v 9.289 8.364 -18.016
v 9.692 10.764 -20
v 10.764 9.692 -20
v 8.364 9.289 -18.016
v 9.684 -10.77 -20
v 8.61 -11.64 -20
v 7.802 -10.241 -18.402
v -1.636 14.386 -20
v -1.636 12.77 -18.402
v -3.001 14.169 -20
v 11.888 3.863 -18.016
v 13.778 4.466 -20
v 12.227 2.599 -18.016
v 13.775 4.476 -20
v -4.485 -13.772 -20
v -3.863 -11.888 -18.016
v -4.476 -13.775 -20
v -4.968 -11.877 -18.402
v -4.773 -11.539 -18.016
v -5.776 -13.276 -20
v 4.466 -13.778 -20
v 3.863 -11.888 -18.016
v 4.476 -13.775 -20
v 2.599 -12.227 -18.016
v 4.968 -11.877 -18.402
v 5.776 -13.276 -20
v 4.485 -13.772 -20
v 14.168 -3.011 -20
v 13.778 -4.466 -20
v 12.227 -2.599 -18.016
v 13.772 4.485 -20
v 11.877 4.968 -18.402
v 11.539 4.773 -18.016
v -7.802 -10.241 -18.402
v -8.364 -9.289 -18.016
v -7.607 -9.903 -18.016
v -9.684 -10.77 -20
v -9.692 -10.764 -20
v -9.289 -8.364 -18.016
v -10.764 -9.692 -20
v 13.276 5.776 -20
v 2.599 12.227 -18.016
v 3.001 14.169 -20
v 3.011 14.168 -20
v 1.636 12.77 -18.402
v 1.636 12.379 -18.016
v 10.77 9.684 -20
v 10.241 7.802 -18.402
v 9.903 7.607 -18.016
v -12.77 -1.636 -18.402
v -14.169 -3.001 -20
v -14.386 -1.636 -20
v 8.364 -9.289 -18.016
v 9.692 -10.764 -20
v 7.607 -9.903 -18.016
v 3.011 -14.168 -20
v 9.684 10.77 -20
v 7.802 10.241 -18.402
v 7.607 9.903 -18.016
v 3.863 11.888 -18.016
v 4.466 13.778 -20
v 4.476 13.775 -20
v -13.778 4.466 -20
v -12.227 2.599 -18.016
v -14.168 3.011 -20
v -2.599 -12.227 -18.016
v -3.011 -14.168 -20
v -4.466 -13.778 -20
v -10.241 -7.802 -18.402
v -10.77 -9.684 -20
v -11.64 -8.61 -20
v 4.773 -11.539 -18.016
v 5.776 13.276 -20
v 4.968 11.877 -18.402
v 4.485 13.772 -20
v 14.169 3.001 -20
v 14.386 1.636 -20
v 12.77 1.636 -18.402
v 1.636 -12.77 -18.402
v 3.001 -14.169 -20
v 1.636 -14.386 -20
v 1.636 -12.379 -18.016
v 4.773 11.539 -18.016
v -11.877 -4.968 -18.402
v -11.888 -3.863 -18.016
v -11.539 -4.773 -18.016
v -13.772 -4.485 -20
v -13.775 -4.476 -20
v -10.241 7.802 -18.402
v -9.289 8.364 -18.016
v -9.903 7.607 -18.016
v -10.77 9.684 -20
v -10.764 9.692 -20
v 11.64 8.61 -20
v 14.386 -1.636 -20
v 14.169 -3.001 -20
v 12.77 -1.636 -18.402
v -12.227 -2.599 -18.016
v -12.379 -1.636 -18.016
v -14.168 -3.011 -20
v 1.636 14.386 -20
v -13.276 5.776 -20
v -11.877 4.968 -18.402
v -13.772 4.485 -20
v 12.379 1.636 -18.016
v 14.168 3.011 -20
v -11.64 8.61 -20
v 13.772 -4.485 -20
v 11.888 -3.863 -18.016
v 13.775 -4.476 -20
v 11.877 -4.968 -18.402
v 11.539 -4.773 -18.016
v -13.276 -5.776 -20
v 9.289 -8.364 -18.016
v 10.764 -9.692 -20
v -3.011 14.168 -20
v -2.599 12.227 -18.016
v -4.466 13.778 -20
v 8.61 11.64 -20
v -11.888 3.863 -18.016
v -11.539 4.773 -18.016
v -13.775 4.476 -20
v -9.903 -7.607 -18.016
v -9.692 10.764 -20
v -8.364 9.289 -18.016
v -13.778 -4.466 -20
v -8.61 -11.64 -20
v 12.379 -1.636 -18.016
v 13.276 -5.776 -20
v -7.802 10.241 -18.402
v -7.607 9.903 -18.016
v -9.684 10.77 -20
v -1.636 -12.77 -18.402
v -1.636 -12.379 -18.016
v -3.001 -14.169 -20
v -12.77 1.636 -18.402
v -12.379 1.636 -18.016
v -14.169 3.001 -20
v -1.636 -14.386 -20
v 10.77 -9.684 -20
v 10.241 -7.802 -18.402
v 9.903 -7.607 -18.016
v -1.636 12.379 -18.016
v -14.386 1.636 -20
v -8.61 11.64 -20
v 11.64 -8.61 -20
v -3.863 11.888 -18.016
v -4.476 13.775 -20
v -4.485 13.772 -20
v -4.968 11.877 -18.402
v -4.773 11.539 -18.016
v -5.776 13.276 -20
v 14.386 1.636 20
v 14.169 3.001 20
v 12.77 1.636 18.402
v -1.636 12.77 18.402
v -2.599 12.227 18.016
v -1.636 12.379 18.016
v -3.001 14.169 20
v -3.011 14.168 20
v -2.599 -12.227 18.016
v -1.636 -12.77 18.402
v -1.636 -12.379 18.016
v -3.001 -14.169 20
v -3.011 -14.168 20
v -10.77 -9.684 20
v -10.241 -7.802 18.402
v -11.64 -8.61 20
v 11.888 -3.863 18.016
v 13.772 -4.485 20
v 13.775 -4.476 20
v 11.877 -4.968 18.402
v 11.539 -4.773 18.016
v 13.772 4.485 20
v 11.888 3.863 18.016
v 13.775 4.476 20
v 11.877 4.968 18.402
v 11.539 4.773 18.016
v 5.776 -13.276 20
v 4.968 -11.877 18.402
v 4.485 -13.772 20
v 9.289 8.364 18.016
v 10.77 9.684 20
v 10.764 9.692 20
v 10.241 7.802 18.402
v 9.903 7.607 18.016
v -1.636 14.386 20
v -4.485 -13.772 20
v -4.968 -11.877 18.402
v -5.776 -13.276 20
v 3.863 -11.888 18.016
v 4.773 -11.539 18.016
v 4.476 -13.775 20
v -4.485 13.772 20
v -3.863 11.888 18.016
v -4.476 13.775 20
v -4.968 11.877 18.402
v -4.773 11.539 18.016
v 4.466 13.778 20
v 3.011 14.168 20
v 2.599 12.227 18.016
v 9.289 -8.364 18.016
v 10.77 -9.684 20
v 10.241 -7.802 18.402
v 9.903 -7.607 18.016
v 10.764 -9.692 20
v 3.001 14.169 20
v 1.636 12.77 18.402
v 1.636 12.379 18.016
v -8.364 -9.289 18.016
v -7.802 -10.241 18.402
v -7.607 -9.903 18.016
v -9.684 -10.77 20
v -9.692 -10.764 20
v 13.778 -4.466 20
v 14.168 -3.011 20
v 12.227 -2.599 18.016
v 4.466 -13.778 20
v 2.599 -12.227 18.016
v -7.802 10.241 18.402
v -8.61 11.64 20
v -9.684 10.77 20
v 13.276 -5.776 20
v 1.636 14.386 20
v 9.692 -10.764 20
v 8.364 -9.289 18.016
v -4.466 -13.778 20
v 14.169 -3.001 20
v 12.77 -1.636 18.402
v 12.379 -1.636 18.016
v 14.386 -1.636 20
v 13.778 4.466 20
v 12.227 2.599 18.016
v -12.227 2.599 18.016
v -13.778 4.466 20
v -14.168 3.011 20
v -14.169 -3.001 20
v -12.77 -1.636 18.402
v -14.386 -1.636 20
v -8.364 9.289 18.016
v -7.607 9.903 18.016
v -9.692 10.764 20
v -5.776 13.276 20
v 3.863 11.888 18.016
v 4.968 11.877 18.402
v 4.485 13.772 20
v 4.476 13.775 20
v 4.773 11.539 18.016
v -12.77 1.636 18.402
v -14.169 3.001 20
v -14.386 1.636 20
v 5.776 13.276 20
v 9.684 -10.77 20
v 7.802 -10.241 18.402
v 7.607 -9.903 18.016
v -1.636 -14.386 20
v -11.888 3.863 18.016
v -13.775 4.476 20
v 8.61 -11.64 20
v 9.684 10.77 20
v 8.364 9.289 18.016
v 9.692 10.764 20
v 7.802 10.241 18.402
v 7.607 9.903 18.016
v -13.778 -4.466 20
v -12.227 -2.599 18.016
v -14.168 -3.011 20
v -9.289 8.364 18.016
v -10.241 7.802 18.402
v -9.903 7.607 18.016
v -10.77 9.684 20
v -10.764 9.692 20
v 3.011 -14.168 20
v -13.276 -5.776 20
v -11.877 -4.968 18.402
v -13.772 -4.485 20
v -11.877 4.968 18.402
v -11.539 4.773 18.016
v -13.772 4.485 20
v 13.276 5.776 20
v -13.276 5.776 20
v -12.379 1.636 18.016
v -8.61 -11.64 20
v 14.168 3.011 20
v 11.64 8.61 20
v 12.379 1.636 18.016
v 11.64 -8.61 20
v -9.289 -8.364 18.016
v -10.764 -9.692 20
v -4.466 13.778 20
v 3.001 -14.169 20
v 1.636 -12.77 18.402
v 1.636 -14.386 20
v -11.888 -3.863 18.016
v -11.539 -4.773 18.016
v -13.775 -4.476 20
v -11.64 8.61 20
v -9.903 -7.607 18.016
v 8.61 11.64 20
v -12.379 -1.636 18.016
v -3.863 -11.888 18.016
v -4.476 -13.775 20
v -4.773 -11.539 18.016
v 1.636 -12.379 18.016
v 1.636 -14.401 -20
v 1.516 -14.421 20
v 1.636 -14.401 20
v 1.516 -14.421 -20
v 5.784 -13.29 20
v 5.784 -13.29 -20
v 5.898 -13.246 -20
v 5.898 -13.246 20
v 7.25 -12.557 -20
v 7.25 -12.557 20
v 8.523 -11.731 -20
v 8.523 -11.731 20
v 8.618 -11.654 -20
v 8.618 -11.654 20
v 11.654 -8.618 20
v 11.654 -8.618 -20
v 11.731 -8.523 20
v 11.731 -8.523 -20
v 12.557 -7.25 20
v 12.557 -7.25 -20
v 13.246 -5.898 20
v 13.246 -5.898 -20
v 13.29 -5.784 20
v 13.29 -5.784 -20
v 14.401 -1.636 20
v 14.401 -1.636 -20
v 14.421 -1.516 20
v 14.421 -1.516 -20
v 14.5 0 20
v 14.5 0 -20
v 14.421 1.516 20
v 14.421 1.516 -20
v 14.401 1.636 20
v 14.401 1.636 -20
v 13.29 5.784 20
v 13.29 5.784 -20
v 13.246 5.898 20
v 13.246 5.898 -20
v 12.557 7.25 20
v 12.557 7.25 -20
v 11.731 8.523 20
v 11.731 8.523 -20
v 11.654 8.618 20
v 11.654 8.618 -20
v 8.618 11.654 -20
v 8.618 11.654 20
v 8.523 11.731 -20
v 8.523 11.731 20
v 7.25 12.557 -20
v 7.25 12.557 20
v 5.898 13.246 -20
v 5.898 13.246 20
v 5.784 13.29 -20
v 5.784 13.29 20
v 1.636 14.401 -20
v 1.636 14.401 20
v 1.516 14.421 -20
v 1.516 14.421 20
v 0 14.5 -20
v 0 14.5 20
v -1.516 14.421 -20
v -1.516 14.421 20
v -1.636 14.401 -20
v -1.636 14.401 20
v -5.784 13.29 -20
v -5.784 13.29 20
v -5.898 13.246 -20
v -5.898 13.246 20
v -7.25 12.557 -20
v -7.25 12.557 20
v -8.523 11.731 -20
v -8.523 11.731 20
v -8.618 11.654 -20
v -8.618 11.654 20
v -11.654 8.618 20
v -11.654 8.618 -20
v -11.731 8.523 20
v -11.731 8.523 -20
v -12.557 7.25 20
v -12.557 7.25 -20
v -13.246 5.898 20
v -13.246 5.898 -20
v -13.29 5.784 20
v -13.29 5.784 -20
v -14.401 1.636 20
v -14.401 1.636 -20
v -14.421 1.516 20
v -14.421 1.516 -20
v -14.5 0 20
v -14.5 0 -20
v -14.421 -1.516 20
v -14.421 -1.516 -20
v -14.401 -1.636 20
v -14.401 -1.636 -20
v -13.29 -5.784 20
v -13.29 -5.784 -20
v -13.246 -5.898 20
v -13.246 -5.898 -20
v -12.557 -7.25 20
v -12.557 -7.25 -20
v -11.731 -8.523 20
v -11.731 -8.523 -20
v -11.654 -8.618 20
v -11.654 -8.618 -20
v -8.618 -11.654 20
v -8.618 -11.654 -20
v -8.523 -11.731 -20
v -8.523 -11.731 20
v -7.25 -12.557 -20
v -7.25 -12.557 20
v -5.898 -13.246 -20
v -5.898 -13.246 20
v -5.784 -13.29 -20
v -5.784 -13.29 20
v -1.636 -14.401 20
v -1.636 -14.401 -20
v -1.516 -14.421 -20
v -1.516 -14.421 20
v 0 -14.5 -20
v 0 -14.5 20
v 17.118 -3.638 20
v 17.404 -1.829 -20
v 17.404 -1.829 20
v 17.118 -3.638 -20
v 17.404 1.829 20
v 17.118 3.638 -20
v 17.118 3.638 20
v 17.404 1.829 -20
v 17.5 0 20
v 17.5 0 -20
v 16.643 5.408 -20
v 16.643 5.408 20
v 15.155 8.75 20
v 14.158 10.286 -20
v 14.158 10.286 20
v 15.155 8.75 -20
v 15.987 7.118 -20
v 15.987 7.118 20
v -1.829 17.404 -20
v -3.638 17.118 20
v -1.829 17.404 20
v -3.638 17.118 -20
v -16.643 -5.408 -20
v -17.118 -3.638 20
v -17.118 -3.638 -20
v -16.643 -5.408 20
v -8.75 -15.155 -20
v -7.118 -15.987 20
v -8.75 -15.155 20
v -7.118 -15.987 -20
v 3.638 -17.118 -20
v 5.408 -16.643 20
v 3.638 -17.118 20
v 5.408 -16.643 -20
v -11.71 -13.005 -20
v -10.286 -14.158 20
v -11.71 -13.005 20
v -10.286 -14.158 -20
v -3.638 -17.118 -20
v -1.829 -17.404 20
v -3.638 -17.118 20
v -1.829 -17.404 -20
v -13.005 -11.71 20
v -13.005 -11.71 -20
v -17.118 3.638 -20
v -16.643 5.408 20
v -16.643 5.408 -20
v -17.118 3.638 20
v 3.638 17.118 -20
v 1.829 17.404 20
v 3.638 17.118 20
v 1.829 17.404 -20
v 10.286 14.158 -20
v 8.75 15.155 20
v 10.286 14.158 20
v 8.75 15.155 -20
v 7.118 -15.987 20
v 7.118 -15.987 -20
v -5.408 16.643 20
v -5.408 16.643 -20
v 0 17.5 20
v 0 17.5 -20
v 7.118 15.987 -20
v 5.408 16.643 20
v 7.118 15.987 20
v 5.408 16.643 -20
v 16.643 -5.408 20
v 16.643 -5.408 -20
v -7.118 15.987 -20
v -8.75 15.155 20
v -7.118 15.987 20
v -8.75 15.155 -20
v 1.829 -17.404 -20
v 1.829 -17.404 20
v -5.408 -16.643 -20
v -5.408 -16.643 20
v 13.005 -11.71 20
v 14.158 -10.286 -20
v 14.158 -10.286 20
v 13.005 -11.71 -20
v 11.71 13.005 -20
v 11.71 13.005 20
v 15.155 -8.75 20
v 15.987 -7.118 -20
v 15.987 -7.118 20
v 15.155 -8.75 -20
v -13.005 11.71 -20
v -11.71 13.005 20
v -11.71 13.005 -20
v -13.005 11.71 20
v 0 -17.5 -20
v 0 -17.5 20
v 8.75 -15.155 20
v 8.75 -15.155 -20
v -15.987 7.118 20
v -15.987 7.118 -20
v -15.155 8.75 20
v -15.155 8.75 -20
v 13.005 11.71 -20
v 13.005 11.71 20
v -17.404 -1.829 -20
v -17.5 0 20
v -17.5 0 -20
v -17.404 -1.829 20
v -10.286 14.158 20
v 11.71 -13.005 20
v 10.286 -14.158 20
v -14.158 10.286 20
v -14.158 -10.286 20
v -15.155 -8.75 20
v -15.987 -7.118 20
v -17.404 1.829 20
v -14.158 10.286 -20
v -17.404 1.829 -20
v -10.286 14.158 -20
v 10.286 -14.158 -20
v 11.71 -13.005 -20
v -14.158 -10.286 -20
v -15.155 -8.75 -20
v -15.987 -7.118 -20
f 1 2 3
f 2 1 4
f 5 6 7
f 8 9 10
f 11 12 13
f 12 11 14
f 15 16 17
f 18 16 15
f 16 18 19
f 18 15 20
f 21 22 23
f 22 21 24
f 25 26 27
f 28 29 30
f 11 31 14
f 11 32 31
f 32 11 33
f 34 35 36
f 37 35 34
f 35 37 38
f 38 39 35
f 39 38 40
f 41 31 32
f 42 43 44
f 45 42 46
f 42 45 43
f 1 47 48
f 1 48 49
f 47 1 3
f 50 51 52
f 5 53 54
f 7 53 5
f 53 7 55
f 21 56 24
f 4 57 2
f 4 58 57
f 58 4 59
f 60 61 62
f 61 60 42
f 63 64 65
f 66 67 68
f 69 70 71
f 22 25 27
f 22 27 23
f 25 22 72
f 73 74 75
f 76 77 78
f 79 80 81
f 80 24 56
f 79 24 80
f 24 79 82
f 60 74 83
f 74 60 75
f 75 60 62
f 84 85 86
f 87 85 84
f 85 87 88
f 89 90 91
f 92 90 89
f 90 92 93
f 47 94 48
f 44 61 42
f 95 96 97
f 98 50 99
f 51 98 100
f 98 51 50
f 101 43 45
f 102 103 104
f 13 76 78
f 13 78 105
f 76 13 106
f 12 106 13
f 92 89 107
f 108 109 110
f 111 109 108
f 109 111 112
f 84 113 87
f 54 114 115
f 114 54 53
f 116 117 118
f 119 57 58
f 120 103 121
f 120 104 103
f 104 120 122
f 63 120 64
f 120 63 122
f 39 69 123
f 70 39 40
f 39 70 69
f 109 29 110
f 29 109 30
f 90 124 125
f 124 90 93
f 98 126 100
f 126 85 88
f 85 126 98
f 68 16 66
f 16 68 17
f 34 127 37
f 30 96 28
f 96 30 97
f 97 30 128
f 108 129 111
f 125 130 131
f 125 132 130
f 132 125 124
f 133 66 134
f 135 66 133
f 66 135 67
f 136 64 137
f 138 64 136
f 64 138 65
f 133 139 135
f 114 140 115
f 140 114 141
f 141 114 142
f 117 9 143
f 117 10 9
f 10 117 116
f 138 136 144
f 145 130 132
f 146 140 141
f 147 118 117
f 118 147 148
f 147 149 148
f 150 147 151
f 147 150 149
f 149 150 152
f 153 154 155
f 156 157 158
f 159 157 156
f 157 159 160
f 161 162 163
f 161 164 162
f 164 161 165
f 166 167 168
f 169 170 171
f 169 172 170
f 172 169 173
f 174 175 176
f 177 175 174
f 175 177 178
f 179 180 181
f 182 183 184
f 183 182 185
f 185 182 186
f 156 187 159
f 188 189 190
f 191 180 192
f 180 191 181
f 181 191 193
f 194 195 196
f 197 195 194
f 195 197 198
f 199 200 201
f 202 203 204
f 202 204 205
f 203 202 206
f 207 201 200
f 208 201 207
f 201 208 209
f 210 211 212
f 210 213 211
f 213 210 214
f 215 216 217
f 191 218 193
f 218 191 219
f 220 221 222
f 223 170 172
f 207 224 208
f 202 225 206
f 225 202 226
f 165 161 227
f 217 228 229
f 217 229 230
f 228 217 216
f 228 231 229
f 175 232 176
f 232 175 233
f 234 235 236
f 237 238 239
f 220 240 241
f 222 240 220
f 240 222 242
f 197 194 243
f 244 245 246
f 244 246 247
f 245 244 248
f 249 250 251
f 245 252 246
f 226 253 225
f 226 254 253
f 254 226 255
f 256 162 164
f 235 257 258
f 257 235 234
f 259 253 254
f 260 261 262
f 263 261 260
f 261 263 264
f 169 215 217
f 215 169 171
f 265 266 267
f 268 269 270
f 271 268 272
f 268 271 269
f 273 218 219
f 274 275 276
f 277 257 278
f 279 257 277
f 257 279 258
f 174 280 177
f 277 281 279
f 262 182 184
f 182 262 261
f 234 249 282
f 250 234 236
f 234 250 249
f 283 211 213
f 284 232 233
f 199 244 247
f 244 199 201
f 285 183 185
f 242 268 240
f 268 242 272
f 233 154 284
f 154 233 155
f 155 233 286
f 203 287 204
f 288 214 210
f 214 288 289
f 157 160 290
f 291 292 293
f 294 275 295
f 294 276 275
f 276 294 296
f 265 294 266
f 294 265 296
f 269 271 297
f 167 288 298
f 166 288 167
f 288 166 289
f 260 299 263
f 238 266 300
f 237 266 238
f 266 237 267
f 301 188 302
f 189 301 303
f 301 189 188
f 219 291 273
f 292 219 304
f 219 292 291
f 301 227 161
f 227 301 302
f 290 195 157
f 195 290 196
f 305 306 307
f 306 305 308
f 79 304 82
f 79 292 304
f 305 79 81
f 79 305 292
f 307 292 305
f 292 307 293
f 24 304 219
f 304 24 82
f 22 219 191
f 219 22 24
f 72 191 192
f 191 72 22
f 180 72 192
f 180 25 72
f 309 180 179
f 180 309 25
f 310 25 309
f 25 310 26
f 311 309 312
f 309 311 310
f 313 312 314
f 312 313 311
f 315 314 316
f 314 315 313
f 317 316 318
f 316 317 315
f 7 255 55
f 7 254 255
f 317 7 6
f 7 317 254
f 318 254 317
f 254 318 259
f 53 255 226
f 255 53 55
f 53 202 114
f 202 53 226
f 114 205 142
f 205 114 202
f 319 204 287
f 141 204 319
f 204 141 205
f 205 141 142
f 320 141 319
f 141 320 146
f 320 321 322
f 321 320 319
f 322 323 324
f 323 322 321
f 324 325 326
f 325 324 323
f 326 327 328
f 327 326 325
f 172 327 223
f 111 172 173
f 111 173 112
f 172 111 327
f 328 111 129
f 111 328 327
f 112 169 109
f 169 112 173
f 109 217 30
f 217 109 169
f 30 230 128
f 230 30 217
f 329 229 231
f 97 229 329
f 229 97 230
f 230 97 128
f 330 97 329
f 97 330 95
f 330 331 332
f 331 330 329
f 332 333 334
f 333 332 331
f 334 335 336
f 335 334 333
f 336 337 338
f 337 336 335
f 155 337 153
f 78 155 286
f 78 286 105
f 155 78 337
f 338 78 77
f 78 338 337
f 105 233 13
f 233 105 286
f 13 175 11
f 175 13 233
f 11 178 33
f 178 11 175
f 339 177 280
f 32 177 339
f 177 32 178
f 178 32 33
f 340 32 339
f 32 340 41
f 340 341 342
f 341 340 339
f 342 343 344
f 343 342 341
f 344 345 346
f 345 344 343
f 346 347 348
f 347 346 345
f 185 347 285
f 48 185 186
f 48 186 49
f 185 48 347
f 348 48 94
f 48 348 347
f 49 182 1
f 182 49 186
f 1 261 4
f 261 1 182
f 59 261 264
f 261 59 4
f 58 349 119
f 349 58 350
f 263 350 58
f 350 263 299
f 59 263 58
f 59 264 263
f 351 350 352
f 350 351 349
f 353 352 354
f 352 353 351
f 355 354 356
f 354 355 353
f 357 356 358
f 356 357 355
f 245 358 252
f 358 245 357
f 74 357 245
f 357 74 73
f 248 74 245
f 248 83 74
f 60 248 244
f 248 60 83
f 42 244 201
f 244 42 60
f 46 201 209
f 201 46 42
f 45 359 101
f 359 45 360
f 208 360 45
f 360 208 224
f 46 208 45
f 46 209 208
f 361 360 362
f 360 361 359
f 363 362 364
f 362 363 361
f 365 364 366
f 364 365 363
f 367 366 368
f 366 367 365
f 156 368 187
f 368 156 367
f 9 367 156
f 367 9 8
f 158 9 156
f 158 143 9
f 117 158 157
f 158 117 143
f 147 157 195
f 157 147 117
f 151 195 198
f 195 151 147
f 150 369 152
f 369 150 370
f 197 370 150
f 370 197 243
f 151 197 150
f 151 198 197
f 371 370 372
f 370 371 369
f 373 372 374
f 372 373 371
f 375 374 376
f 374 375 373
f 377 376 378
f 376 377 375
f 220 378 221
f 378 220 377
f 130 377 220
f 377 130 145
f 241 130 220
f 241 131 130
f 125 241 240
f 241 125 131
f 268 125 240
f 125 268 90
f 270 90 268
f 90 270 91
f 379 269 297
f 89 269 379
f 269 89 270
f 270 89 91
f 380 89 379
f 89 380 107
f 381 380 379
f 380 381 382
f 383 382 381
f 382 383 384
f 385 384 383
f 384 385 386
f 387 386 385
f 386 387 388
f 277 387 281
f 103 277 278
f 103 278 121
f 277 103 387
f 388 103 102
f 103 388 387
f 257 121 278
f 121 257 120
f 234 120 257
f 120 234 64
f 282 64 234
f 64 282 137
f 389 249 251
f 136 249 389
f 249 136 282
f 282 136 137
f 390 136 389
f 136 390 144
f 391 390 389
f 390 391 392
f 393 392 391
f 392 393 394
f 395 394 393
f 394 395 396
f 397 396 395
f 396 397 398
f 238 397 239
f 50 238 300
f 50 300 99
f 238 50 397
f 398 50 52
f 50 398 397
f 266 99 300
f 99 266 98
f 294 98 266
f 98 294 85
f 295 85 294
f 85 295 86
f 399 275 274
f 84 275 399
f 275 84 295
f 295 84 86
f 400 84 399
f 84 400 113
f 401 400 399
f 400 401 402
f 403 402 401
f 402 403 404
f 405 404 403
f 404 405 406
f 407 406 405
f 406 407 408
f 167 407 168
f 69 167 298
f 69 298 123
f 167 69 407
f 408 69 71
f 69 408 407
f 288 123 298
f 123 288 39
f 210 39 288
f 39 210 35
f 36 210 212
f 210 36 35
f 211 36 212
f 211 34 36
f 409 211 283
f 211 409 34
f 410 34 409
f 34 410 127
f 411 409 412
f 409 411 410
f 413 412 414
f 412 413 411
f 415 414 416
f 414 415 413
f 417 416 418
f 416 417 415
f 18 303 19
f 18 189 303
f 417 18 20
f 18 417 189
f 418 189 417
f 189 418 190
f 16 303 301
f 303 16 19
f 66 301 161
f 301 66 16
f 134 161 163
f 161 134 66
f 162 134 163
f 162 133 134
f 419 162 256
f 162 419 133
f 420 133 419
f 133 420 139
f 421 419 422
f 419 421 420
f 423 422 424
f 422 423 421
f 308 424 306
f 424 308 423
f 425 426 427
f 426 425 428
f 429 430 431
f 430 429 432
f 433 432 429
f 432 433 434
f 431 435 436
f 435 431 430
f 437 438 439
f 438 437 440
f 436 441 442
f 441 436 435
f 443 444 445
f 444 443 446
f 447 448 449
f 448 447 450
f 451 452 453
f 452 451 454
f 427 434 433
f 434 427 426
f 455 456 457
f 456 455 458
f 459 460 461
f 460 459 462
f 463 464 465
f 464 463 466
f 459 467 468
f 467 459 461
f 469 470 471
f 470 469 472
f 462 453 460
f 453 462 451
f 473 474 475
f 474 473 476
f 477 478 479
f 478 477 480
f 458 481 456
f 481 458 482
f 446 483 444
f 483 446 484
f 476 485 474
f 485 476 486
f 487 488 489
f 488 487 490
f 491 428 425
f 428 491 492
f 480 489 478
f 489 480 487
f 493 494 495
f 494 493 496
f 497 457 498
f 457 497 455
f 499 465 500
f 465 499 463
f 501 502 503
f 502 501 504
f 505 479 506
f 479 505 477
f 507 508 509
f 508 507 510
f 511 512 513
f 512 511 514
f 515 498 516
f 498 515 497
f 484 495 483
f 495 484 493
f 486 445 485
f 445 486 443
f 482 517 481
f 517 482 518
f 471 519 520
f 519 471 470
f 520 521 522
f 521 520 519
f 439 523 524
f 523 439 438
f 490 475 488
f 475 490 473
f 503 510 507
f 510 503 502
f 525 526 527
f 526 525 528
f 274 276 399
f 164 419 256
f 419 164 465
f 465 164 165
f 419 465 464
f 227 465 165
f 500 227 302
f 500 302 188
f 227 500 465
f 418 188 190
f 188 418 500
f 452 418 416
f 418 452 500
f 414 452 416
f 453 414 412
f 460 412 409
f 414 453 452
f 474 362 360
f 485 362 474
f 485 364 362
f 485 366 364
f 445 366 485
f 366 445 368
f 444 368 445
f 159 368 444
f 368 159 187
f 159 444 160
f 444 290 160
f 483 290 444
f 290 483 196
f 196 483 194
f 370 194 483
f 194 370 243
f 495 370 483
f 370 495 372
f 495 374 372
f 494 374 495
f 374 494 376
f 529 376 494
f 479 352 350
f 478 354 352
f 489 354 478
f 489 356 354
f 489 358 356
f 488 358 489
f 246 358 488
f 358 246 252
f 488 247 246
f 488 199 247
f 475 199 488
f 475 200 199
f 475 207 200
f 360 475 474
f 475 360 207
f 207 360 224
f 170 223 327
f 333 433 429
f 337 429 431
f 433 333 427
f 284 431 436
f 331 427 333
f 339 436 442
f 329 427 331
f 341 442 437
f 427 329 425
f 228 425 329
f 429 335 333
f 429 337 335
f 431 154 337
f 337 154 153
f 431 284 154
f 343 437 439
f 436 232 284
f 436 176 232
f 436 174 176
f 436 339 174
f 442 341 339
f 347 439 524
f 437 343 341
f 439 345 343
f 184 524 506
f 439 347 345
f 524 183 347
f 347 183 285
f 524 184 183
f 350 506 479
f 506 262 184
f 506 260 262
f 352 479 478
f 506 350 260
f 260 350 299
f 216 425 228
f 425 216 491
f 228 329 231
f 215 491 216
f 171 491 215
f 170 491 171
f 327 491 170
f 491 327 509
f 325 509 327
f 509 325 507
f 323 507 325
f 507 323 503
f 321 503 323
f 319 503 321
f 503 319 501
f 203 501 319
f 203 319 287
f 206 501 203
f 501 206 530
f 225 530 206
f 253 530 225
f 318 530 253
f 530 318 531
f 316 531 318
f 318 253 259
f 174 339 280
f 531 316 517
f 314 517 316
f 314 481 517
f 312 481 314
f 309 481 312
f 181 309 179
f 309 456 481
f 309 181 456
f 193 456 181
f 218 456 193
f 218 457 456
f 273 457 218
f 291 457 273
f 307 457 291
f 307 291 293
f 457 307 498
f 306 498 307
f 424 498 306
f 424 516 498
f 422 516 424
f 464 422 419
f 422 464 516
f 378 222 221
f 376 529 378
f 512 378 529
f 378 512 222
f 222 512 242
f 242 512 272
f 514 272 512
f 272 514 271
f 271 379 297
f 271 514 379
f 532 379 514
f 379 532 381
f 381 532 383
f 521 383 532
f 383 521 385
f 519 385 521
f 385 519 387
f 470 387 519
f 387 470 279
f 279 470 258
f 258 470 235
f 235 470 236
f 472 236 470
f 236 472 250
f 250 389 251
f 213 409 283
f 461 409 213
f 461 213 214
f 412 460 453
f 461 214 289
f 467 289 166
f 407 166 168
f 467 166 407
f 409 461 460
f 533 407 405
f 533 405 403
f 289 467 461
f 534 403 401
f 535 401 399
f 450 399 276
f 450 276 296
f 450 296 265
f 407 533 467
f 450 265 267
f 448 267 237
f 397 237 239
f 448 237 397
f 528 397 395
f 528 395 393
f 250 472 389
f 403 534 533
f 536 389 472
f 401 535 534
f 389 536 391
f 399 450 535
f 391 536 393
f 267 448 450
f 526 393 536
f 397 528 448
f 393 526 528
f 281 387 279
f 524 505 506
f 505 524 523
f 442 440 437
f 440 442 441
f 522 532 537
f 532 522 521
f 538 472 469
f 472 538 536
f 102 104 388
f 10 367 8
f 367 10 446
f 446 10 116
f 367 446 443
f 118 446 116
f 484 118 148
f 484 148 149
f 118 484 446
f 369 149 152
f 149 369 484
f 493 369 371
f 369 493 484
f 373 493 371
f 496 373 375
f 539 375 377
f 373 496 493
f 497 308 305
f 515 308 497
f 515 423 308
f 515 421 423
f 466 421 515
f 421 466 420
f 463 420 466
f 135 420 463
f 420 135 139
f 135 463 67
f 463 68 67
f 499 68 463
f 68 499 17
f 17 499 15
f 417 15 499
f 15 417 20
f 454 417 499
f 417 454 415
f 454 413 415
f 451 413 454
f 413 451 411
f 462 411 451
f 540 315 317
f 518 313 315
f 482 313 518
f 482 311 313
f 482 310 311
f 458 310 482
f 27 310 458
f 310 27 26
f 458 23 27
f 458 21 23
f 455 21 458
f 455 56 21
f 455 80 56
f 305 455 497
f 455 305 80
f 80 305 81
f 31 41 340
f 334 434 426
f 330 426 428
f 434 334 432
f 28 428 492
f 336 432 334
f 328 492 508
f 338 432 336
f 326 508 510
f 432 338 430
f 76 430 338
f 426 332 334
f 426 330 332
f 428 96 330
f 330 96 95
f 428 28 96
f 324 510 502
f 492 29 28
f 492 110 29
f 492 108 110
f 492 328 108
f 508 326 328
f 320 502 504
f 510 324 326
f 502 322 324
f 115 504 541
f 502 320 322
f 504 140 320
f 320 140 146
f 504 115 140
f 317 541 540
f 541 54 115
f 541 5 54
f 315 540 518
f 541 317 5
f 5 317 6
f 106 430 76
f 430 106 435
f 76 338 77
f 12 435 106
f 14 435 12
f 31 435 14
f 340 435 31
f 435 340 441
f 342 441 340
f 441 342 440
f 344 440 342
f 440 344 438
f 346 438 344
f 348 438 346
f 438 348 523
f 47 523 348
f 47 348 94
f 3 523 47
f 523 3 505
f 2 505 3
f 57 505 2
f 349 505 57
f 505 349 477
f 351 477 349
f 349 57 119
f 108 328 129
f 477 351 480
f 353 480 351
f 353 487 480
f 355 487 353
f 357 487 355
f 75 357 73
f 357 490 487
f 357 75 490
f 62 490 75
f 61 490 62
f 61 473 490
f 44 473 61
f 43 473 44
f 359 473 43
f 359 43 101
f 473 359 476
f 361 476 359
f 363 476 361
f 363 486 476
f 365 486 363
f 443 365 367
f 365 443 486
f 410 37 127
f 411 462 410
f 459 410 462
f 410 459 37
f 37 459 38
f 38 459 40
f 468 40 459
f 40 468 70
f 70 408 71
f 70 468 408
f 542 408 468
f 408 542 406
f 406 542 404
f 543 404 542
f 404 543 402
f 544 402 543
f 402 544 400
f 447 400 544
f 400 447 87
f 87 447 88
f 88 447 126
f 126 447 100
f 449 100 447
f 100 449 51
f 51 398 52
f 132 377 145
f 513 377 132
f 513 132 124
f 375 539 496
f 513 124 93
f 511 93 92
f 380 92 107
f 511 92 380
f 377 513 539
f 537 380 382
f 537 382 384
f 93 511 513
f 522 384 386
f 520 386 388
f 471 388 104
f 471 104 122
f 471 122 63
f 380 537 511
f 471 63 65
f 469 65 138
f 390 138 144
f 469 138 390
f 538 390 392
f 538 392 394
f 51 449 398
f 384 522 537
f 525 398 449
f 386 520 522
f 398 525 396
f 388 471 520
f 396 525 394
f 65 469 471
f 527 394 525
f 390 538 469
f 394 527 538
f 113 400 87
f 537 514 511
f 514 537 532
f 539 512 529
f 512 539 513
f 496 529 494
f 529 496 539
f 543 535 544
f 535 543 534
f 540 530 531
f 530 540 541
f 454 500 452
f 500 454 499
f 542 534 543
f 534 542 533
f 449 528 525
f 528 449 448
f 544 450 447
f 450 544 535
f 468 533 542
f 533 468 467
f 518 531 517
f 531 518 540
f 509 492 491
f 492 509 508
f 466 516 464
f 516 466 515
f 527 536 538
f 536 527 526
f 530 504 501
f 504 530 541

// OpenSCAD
// file: common.scad
include <../../globals.scad>

// The drawing of bushing bore
module bushing_bore_sketch(
    inner_radius,
    pin_height=0,
    pin_count=12,
    pin_bore_coverage=0.5
) {    
    assert(pin_bore_coverage >= 0);
    assert(pin_bore_coverage <= 1);
    assert(pin_height >= 0);
    assert(pin_count >= 3);
    assert(pin_bore_coverage * 2 * PI * inner_radius / pin_count >= EXTRUSION_WIDTH, "Pins too small to print");

    
    pin_width =  (1 - pin_bore_coverage) * 2 * PI * inner_radius / pin_count;
    pin_length = inner_radius + pin_height;
       
    // create the rod
    circle(r=inner_radius);
    
    if(pin_height > 0) {
        // create the pins
        intersection() {
            // pins
            for(a=[0:360/pin_count:360])
                rotate(a)
                    translate([0,-pin_width/2])
                        square([pin_length, pin_width]);
            // round over pin ends
            circle(pin_length);
        }
    }
}

// The bore as a volume
module bushing_bore(
    inner_radius,
    height,
    chamfer,
    pin_height=0,
    pin_count=12,
    pin_bore_coverage=0.5,
) {
    chamfer = default(chamfer, default(pin_height, 0));

    // Bore body
    linear_extrude(height, center=true)
        bushing_bore_sketch(
            inner_radius=inner_radius,
            pin_height=pin_height,
            pin_count=pin_count,
            pin_bore_coverage=pin_bore_coverage
        );
    
    if(chamfer > 0) {
        // Lower chamfer
        translate([0,0, - height / 2])
        cylinder(chamfer, r1=inner_radius + chamfer, r2=inner_radius);
        
        // Upper chamfer
        rotate([180,0,0])
        translate([0,0, - height / 2])
        cylinder(chamfer, r1=inner_radius + chamfer, r2=inner_radius);
    }
}

// The body of flanged bushing
module bushing_flanged_body(
    radius,
    height,
    flange_radius,
    flange_height,
    flange_chamfer)
{
        translate([0,0,-height/2])
        rotate_extrude()
        offset(delta=-flange_chamfer, chamfer=true)
        offset(delta=flange_chamfer) {
            square([radius, height]);
            square([flange_radius, flange_height]);
        }  
}
// file: ../../globals.scad
//$fa = $preview? 12 : 6;
//$fs = $preview? 2 : 0.2;

EPS = 1/64;

// Used for indexing coordinates since the dot syntax is not
// officialy supported
X = 0;
Y = 1;
Z = 2;

// Slicer defaults
LAYER_HEIGHT = 0.15;
EXTRUSION_WIDTH = 0.45;

function nearest_layer_height(n) = round(n / LAYER_HEIGHT) * LAYER_HEIGHT;
function nearest_extrusion_width(n) = round(n / EXTRUSION_WIDTH) * EXTRUSION_WIDTH;

// Defaults for all parts
WALL_XS = nearest_extrusion_width(1.25);
WALL_S = nearest_extrusion_width(2);
WALL = nearest_extrusion_width(3);
WALL_L = nearest_extrusion_width(5);
WALL_XL = nearest_extrusion_width(7.5);

// Seems to be a good middle ground, corresponds to #8 for imperial ones
SCREW = 4;

// Set up OpenSCAD rendering defaults
$fa = 6;
$fs = EXTRUSION_WIDTH / 2;

function default(v, d) = is_undef(v)? d : v;

// For engraving in all planes except those parrallel to XY.
module v_engrave(t, size=10) {
    translate([0, 0.3, 0])
    rotate([90,0,0])
    linear_extrude(0.3 + EPS)
    text(t, size=size, font="DejaVu Sans:style=Book", valign="center", halign="center", $fn=8);
}

// For engraving in all planes parrallel to XY.
module h_engrave(t, size=10) {
    translate([0, 0, -0.7])
    linear_extrude(0.7 + EPS)
    text(t, size=size, font="DejaVu Sans:style=Book", valign="center", halign="center", $fn=8);
}

// Used for creating screw holes
module screw(height, head_extra_height=0) {
    translate([0,0, -(height + head_extra_height) / 2]) {
        cylinder(height, r=SCREW/2);
        
        translate([0,0,height-SCREW/2])
        cylinder(SCREW/2, r1=SCREW/2, r2=SCREW);
        
        translate([0,0,height - EPS])
        cylinder(head_extra_height + EPS, r=SCREW);
    }
}
// main file
include <../../globals.scad>;
use <common.scad>;


// The height of the bushing
H = 40;

// Diameter of the bore
D = 25;

// Outer diameter of the bushing
O = 35;

// Pin height (0 to disable)
P = 2;

// The amount of pins
N = 12;

// Percentage of rod circumference covered by pins
I = 0.5; //[0:0.01:1]

// The distance which should be chamfered
C = 2;


module cylindrical_bushing(
            bore_radius,
            height,
            radius,
            chamfer=0,
            pin_height=0,
            pin_count=12,
            pin_bore_coverage=0.5
           )
{    
    radius = default(radius, bore_radius + max(chamfer, pin_height) + WALL); 
    assert(radius >= bore_radius + max(chamfer, pin_height) + WALL_XS);
        
    difference() {
        cylinder(height, r=radius, center=true);
        bushing_bore(bore_radius, height + 2*EPS, chamfer, pin_height, pin_count, pin_bore_coverage);
    }
}

cylindrical_bushing(D/2,H, O/2, C, P, N, I);
